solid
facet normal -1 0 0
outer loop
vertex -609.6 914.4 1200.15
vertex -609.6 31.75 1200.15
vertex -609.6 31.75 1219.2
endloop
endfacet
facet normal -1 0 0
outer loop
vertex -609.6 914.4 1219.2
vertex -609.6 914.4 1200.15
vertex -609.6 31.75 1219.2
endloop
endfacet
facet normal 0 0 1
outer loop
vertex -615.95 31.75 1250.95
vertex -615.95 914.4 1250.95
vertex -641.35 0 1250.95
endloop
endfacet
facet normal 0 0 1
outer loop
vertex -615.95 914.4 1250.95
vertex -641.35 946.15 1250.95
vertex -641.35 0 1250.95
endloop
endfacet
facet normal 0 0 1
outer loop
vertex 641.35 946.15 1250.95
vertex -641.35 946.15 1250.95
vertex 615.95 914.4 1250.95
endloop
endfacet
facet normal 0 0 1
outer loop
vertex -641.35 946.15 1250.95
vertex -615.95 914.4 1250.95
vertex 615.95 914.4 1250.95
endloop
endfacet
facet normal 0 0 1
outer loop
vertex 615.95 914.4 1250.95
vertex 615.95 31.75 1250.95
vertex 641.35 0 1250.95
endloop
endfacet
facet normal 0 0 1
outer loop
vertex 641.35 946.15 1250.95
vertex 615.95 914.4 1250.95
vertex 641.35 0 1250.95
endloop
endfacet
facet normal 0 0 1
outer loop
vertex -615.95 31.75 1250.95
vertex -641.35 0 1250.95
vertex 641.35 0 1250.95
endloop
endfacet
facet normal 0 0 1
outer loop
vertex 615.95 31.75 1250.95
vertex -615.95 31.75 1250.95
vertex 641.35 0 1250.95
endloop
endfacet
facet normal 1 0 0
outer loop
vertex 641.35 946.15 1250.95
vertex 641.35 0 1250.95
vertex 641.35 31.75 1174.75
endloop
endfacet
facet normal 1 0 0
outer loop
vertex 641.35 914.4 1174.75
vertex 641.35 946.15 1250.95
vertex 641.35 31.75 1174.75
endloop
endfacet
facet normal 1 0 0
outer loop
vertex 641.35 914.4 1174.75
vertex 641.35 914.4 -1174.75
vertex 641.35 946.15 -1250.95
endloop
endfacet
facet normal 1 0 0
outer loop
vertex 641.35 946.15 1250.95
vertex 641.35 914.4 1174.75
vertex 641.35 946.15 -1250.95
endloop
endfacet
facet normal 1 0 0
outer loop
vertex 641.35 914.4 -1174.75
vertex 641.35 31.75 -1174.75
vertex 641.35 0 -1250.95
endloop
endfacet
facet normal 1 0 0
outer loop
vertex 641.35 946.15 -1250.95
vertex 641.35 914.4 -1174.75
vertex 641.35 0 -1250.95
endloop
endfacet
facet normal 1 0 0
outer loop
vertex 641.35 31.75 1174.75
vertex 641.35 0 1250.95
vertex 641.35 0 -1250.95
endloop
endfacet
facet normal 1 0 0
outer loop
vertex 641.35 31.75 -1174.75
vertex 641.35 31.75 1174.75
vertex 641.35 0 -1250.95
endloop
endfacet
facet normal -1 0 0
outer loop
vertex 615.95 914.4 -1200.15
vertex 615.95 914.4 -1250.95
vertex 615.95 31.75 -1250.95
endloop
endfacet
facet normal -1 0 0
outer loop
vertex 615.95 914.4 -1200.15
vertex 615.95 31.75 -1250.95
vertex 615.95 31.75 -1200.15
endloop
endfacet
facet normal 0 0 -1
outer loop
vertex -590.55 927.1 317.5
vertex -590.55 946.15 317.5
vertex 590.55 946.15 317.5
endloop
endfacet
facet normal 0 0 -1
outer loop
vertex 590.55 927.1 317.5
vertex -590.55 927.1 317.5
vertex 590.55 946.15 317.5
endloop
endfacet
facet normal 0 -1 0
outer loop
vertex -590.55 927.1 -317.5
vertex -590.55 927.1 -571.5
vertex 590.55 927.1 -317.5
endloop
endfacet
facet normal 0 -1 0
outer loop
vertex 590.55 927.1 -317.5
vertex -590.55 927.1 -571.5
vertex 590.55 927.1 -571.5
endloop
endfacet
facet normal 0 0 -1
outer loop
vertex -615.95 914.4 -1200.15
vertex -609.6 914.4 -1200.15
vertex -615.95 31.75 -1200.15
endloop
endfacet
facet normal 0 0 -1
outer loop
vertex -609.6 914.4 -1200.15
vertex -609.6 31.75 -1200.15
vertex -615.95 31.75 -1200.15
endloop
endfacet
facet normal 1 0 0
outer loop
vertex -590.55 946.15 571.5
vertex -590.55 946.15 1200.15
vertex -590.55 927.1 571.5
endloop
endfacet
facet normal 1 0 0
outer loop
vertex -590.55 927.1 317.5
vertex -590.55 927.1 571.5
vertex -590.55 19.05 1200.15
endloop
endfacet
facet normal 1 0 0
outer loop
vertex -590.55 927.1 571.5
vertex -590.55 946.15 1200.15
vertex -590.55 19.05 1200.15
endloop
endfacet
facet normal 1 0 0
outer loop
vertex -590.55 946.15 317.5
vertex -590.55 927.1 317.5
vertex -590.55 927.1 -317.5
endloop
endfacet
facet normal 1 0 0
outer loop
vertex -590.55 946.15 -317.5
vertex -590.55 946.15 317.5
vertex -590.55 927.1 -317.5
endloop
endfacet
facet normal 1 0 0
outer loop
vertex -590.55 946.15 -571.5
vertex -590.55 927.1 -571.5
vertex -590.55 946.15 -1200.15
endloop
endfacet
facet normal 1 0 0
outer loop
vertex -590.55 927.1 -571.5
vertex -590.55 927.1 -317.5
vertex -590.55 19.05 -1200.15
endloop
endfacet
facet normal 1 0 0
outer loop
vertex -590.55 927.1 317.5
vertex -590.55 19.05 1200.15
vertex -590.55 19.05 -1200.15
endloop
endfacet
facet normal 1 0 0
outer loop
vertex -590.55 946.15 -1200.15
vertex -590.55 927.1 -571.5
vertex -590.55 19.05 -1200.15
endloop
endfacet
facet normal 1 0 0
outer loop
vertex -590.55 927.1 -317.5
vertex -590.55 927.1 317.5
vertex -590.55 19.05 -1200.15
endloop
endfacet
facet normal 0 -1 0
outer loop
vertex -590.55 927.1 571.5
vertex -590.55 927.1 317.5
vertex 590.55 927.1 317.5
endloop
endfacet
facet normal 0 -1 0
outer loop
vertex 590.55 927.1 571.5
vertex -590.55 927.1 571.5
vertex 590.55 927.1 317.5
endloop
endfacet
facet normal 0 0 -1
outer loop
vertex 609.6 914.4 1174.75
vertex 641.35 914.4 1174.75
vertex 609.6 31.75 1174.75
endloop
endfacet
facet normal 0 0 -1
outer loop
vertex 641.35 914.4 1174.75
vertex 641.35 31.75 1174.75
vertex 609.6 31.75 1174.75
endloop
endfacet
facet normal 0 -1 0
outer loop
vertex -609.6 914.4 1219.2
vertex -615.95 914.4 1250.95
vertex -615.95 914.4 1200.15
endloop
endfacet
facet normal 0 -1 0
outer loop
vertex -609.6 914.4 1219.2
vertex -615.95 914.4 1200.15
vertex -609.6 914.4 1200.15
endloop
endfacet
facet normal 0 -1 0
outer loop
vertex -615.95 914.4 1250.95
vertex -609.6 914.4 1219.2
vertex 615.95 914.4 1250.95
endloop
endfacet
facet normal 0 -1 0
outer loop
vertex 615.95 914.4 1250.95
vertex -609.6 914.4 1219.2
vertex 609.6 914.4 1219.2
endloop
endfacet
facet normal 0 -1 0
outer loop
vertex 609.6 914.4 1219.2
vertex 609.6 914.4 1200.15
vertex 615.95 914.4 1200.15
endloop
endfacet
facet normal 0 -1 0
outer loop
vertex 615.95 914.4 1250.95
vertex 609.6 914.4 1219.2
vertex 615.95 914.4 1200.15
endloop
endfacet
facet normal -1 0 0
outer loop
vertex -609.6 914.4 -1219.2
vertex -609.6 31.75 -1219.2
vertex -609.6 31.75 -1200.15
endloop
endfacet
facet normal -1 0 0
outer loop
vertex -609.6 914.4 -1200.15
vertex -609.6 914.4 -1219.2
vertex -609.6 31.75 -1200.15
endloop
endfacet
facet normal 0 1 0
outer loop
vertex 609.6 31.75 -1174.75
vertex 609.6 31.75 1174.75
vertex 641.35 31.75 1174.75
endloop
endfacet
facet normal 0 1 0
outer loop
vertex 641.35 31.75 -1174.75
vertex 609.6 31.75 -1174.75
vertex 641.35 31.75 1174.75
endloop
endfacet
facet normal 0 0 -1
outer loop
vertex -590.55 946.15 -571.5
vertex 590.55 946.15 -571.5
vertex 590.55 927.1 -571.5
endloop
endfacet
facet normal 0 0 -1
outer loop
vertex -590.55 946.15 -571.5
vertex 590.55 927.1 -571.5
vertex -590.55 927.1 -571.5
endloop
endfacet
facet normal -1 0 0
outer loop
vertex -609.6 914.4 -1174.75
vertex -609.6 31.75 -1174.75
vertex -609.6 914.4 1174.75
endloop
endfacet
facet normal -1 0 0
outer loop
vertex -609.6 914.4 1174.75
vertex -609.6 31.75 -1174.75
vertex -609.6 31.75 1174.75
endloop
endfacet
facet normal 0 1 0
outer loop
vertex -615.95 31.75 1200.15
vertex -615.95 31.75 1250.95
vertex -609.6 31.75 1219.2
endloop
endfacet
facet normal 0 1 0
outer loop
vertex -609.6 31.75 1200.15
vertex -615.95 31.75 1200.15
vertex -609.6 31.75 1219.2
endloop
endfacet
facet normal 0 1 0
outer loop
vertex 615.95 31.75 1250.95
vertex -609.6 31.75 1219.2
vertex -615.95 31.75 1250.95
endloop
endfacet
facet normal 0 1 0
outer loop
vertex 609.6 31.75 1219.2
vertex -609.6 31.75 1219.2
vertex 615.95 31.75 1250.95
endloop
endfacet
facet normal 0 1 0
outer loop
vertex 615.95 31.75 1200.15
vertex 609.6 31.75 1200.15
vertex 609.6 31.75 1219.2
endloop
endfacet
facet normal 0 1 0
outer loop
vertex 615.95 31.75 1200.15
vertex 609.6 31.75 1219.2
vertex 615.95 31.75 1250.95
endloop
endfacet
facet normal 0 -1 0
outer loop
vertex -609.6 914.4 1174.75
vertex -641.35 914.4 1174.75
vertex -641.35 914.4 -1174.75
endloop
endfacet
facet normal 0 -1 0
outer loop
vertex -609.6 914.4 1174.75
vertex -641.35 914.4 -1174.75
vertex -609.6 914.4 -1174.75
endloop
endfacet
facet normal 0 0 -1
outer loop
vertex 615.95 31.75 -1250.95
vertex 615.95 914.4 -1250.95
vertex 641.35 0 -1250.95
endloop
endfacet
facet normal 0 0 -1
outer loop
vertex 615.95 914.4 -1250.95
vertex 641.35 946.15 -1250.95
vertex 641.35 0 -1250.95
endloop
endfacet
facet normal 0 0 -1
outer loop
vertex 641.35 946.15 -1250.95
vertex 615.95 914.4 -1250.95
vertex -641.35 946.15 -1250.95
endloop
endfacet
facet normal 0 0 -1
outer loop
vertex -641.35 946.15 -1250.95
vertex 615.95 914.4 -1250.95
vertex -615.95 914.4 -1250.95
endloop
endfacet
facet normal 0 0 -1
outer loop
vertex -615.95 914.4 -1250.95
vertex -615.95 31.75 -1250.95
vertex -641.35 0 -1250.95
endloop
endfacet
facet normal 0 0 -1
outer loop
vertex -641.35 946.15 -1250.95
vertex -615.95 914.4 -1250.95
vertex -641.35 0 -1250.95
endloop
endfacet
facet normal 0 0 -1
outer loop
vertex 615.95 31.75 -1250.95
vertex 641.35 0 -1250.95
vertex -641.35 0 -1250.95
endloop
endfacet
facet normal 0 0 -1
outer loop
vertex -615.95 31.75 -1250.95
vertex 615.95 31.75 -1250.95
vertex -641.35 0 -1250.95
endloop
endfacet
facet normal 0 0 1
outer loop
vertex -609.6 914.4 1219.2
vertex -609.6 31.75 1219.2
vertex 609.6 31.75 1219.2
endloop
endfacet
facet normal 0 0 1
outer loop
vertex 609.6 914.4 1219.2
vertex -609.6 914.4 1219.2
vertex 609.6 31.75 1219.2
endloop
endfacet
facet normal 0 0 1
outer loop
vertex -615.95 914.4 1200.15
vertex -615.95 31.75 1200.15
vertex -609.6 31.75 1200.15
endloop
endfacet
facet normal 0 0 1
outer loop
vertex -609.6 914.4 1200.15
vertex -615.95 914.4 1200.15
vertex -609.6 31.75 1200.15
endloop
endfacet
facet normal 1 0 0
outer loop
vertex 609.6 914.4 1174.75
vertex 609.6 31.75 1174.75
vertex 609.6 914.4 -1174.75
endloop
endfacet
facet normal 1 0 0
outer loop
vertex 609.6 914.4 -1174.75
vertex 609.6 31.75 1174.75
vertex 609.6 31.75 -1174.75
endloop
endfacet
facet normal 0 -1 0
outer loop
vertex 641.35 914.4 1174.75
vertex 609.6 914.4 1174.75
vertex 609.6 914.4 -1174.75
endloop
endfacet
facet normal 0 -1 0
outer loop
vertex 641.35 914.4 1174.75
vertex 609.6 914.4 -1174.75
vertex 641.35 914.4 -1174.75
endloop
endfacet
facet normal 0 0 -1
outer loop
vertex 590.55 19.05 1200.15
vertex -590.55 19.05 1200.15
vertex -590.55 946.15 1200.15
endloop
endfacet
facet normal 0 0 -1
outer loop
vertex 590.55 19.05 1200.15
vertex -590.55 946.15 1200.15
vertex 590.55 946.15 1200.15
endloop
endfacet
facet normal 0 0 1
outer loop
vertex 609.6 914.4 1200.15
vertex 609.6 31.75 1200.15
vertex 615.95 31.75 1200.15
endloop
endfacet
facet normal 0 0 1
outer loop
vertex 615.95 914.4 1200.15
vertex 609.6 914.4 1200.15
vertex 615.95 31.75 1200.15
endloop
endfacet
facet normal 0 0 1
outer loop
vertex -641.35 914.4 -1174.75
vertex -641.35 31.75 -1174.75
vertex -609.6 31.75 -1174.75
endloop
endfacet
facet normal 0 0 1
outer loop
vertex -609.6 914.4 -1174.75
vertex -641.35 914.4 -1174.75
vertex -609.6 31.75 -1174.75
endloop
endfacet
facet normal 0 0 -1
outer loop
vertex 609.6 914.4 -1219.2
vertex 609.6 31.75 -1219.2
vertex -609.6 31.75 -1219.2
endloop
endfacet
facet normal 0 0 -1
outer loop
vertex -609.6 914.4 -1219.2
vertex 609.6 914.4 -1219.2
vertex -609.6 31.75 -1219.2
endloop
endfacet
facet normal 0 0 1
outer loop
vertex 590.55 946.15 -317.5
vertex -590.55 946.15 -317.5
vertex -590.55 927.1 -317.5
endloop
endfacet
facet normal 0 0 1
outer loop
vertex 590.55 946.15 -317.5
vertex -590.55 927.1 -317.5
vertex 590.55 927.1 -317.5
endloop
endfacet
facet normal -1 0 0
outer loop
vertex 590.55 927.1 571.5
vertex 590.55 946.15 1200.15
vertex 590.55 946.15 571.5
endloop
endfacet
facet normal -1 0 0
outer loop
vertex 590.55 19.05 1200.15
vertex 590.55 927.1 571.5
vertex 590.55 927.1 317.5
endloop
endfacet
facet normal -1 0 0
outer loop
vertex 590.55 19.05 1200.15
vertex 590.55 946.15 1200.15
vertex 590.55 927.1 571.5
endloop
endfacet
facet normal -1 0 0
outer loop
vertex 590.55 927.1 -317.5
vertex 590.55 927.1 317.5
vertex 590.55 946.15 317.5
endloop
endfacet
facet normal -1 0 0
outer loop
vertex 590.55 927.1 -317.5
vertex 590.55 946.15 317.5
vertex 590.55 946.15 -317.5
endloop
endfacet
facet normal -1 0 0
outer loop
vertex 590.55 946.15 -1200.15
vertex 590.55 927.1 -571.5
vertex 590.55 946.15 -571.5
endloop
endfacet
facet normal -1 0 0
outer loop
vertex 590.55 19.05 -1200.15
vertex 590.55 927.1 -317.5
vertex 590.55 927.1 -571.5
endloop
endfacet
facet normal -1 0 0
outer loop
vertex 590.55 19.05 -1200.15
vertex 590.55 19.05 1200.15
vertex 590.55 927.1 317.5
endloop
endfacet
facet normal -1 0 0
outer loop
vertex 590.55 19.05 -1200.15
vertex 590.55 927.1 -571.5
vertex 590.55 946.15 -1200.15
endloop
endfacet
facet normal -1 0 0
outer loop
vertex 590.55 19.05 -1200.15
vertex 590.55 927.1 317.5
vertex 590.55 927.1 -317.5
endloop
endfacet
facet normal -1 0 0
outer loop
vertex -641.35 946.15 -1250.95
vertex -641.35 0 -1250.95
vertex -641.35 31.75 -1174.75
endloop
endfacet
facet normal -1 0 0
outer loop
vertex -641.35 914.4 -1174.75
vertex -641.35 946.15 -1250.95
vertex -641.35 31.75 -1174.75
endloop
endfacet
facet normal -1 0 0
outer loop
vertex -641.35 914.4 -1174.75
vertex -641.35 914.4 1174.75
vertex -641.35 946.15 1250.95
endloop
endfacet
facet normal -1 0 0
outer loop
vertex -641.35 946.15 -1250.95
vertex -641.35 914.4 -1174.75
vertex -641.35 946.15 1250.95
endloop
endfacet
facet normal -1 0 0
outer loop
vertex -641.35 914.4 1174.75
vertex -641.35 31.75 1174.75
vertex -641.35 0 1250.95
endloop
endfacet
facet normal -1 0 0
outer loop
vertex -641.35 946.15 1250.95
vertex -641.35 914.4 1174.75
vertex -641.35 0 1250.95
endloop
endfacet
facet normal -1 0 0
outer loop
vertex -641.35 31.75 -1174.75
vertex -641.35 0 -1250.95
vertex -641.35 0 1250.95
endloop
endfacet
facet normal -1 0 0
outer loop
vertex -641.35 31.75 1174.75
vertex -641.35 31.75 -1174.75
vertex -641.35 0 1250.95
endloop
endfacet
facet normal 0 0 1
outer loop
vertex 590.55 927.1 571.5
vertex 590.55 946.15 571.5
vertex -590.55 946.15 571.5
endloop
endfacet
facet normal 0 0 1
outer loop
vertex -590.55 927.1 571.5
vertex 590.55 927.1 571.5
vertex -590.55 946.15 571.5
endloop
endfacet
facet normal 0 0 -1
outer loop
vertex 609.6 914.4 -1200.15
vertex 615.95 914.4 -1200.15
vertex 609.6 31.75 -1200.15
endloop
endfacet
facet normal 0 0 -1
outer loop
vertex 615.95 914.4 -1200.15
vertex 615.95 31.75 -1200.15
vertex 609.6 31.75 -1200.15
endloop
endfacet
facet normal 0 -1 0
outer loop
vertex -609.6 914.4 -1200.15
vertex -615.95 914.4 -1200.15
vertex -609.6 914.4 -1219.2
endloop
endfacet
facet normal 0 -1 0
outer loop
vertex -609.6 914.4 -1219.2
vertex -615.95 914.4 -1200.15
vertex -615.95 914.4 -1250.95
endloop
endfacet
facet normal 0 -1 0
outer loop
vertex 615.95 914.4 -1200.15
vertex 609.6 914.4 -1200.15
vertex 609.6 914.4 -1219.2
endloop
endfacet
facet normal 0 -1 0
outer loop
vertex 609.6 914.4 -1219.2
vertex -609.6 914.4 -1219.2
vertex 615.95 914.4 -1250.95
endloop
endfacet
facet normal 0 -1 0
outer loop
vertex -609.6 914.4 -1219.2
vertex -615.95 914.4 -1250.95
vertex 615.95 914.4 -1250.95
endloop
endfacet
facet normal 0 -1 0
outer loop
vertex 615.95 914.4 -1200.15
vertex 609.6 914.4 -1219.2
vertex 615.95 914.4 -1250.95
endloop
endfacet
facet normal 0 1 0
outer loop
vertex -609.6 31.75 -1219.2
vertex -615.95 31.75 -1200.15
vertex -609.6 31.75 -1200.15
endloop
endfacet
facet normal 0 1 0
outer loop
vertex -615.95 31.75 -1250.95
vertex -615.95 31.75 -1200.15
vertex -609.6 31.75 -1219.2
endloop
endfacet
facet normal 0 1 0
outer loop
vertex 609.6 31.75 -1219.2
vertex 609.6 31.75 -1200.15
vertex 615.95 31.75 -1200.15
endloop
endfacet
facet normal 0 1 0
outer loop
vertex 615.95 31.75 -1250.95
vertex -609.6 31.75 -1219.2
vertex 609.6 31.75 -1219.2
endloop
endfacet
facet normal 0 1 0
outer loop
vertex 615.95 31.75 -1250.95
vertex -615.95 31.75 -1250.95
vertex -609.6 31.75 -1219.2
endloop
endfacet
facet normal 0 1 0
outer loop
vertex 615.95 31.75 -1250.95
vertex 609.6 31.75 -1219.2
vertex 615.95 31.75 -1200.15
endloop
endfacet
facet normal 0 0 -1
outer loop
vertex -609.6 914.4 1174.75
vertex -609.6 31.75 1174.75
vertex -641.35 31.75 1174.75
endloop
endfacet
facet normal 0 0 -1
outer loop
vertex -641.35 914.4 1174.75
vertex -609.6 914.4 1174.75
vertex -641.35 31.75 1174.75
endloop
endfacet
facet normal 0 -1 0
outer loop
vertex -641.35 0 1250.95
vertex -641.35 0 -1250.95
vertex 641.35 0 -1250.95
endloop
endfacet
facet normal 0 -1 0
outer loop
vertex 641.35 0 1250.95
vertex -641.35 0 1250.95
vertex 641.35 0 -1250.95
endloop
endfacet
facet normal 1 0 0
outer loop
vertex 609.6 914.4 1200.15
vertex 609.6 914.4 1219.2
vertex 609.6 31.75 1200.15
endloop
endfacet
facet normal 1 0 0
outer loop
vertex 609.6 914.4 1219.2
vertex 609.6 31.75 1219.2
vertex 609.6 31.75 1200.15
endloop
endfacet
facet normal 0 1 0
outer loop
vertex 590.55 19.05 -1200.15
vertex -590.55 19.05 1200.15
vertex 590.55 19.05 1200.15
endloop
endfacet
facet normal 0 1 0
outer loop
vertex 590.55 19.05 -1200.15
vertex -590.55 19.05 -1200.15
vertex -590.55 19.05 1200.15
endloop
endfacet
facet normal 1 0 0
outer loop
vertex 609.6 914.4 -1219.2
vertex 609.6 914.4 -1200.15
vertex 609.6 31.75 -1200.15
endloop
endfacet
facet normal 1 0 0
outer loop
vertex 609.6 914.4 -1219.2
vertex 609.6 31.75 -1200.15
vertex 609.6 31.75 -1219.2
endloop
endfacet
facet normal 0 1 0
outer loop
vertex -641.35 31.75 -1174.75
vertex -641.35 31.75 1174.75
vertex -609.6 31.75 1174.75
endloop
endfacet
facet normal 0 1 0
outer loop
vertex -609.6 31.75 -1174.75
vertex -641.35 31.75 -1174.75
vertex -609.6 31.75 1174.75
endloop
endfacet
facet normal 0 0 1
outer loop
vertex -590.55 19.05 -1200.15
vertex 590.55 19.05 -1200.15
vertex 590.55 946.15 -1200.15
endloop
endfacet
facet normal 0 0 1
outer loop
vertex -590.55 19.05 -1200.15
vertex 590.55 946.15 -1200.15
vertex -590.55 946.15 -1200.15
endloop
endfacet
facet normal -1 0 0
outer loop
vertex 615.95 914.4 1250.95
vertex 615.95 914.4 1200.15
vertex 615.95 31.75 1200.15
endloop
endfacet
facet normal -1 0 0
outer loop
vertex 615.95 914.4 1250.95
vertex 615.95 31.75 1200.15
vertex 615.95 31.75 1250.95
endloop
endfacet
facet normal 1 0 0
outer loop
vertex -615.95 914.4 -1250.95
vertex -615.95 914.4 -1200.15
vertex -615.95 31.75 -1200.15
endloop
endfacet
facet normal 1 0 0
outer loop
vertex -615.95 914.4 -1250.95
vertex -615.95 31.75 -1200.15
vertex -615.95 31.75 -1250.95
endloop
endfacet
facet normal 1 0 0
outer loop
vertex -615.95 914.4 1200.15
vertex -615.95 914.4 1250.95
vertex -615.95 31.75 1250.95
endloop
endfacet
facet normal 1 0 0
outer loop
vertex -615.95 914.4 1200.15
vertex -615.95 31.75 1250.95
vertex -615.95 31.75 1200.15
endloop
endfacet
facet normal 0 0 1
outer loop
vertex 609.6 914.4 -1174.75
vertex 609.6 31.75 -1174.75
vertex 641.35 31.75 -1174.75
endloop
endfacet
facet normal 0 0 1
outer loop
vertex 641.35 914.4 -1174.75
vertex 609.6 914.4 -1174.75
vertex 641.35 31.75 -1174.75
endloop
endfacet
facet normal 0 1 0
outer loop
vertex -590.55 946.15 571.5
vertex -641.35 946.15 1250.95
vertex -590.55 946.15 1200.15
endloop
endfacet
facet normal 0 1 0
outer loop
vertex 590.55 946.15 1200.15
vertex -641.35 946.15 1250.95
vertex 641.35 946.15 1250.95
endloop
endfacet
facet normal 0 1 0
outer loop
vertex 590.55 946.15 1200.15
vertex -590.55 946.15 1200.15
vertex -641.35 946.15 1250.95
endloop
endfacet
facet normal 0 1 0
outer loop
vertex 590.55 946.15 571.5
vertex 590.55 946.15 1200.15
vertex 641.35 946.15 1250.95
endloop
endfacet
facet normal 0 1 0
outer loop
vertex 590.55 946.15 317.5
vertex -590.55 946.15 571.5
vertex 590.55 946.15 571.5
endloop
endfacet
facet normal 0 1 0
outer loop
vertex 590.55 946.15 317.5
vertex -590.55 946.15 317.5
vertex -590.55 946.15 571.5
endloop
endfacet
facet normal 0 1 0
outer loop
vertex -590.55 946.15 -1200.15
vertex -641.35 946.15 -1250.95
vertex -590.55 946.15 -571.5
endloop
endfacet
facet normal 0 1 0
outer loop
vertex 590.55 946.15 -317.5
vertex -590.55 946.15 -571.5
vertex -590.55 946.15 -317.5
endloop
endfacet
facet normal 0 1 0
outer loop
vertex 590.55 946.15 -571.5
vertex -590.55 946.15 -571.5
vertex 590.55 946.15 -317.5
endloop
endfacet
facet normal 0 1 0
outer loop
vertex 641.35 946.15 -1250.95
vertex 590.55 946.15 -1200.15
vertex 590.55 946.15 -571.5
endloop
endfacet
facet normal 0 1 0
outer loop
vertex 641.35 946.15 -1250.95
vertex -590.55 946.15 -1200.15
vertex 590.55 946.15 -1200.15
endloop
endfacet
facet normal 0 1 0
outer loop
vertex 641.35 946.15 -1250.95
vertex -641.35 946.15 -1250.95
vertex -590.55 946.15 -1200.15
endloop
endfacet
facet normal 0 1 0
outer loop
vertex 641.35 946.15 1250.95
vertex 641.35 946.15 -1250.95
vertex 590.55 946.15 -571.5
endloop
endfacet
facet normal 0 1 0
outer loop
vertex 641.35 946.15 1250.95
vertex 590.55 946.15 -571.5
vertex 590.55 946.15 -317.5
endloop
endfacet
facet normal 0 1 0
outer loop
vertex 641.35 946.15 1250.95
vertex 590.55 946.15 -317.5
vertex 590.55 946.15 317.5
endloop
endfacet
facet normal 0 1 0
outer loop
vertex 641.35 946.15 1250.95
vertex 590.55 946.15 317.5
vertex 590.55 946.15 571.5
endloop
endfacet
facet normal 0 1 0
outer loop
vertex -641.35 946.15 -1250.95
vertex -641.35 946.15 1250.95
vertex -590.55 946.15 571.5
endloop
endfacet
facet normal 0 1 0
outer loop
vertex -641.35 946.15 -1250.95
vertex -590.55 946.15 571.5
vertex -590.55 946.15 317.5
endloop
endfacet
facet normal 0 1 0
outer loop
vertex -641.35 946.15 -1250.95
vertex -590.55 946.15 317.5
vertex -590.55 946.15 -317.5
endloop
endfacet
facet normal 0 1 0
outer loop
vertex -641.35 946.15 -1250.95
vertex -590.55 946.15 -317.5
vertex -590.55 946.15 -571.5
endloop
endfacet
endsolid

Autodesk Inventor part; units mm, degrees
ref_plane "YZ Plane" through (0, 0, 0) normal (1, 0, 0) x (0, 1, 0)
ref_plane "XZ Plane" through (0, 0, 0) normal (0, 1, 0) x (-1, 0, 0)
ref_plane "XY Plane" through (0, 0, 0) normal (0, 0, 1) x (1, 0, 0)
sketch "Sketch1" plane through (0, 0, 0) normal (0, 1, 0) x (-1, 0, 0)
  line L0 (-609.6, -1219.2) -> (609.6, -1219.2)
  line L1 (609.6, -1219.2) -> (609.6, 1219.2)
  line L2 (609.6, 1219.2) -> (-609.6, 1219.2)
  line L3 (-609.6, 1219.2) -> (-609.6, -1219.2)
  line L4 (-609.6, -1219.2) -> (609.6, 1219.2) construction
  line L5 (609.6, -1219.2) -> (-609.6, 1219.2) construction
  point P0 (0, 0)
  dimension "d0" = 1219.2
  dimension "d1" = 2438.4
extrude "Extrusion1" add sketch "Sketch1" along normal blind 914.4
sketch "Sketch2" plane through (0, 914.4, 0) normal (0, 1, 0) x (1, 0, 0)
  line L0 (590.55, 1200.15) -> (-590.55, 1200.15)
  line L1 (-590.55, 1200.15) -> (-590.55, -1200.15)
  line L2 (-590.55, -1200.15) -> (590.55, -1200.15)
  line L3 (590.55, -1200.15) -> (590.55, 1200.15)
  line L4 (590.55, 1200.15) -> (-590.55, -1200.15) construction
  line L5 (-590.55, 1200.15) -> (590.55, -1200.15) construction
  point P0 (0, 0)
  dimension "d4" = 1181.1
  dimension "d5" = 2400.3
extrude "Extrusion2" cut sketch "Sketch2" against normal blind 895.35
sketch "Sketch3" plane through (0, 914.4, 0) normal (0, 1, 0) x (1, 0, 0)
  line L0 (641.35, 1250.95) -> (-641.35, 1250.95)
  line L1 (-641.35, 1250.95) -> (-641.35, -1250.95)
  line L2 (-641.35, -1250.95) -> (641.35, -1250.95)
  line L3 (641.35, -1250.95) -> (641.35, 1250.95)
  line L4 (641.35, 1250.95) -> (-641.35, -1250.95) construction
  line L5 (-641.35, 1250.95) -> (641.35, -1250.95) construction
  line L6 (-590.55, -1200.15) -> (-590.55, 1200.15) projected
  line L7 (590.55, 1200.15) -> (-590.55, 1200.15)
  line L8 (-590.55, 1200.15) -> (-590.55, -1200.15)
  line L9 (-590.55, -1200.15) -> (590.55, -1200.15)
  line L10 (590.55, -1200.15) -> (590.55, 1200.15)
  line L11 (590.55, 1200.15) -> (-590.55, -1200.15) construction
  line L12 (-590.55, 1200.15) -> (590.55, -1200.15) construction
  point P0 (0, 0)
  point P1 (-590.55, 1200.15)
  dimension "d8" = 1282.7
  dimension "d9" = 2501.9
extrude "Extrusion3" add sketch "Sketch3" along normal blind 31.75
pattern_linear "Rectangular Pattern1" count 2 spacing 914.4 along (0, -1, 0) of "Extrusion3"
sketch "Sketch4" plane through (-641.35, 31.75, 1250.95) normal (0, 1, 0) x (1, 0, 0)
  line L0 (0, 0) -> (1282.7, 0) projected
  line L1 (1282.7, 0) -> (1282.7, 76.2)
  line L2 (1282.7, 0) -> (1282.7, 2501.9) projected
  line L3 (1282.7, 76.2) -> (1231.9, 76.2)
  line L4 (1231.9, 2451.1) -> (1231.9, 50.8) projected
  line L5 (1231.9, 76.2) -> (1231.9, 50.8)
  line L6 (1231.9, 50.8) -> (1257.3, 50.8)
  line L7 (1231.9, 50.8) -> (50.8, 50.8) projected
  line L8 (1257.3, 50.8) -> (1257.3, 0)
  line L9 (1257.3, 0) -> (1282.7, 0)
  point P0 (641.35, 1250.95)
  point P1 (1257.3, 0)
  dimension "d15" = 76.2
  dimension "d16" = 50.8
  dimension "d17" = 25.4
  dimension "d23" = 25.4
  dimension "d24" = 50.8
  dimension "d25" = 25.4
extrude "Extrusion4" add sketch "Sketch4" along normal blind 889
mirror "Mirror2" about plane through (0, 0, 0) normal (1, 0, 0) of "Extrusion4"
mirror "Mirror3" about plane through (0, 0, 0) normal (0, 0, 1) of "Extrusion4", "Mirror2"
sketch "Sketch5" plane through (0, 946.15, 0) normal (0, 1, 0) x (1, 0, 0)
  line L0 (-590.55, -1200.15) -> (-590.55, 1200.15) projected
  line L1 (590.55, -571.5) -> (-590.55, -571.5)
  line L2 (-590.55, -571.5) -> (-590.55, -317.5)
  line L3 (-590.55, -317.5) -> (590.55, -317.5)
  line L4 (590.55, -317.5) -> (590.55, -571.5)
  line L5 (590.55, -571.5) -> (-590.55, -317.5) construction
  line L6 (-590.55, -571.5) -> (590.55, -317.5) construction
  line L7 (590.55, 571.5) -> (-590.55, 571.5)
  line L8 (-590.55, 571.5) -> (-590.55, 317.5)
  line L9 (-590.55, 317.5) -> (590.55, 317.5)
  line L10 (590.55, 317.5) -> (590.55, 571.5)
  line L11 (590.55, 571.5) -> (-590.55, 317.5) construction
  line L12 (-590.55, 571.5) -> (590.55, 317.5) construction
  line L13 (-590.55, 1200.15) -> (590.55, 1200.15) projected
  line L14 (590.55, -1200.15) -> (-590.55, -1200.15) projected
  point P0 (0, 0)
  point P1 (0, -444.5)
  point P2 (0, 444.5)
  point P3 (-590.55, 63.5)
  point P4 (-590.55, 571.5)
  dimension "d26" = 254
  dimension "d27" = 254
  dimension "d31" = 628.65
  dimension "d34" = 628.65
  dimension "d35" = 635
extrude "Extrusion5" add sketch "Sketch5" against normal blind 19.05
properties part number "GlassCagesTank"
